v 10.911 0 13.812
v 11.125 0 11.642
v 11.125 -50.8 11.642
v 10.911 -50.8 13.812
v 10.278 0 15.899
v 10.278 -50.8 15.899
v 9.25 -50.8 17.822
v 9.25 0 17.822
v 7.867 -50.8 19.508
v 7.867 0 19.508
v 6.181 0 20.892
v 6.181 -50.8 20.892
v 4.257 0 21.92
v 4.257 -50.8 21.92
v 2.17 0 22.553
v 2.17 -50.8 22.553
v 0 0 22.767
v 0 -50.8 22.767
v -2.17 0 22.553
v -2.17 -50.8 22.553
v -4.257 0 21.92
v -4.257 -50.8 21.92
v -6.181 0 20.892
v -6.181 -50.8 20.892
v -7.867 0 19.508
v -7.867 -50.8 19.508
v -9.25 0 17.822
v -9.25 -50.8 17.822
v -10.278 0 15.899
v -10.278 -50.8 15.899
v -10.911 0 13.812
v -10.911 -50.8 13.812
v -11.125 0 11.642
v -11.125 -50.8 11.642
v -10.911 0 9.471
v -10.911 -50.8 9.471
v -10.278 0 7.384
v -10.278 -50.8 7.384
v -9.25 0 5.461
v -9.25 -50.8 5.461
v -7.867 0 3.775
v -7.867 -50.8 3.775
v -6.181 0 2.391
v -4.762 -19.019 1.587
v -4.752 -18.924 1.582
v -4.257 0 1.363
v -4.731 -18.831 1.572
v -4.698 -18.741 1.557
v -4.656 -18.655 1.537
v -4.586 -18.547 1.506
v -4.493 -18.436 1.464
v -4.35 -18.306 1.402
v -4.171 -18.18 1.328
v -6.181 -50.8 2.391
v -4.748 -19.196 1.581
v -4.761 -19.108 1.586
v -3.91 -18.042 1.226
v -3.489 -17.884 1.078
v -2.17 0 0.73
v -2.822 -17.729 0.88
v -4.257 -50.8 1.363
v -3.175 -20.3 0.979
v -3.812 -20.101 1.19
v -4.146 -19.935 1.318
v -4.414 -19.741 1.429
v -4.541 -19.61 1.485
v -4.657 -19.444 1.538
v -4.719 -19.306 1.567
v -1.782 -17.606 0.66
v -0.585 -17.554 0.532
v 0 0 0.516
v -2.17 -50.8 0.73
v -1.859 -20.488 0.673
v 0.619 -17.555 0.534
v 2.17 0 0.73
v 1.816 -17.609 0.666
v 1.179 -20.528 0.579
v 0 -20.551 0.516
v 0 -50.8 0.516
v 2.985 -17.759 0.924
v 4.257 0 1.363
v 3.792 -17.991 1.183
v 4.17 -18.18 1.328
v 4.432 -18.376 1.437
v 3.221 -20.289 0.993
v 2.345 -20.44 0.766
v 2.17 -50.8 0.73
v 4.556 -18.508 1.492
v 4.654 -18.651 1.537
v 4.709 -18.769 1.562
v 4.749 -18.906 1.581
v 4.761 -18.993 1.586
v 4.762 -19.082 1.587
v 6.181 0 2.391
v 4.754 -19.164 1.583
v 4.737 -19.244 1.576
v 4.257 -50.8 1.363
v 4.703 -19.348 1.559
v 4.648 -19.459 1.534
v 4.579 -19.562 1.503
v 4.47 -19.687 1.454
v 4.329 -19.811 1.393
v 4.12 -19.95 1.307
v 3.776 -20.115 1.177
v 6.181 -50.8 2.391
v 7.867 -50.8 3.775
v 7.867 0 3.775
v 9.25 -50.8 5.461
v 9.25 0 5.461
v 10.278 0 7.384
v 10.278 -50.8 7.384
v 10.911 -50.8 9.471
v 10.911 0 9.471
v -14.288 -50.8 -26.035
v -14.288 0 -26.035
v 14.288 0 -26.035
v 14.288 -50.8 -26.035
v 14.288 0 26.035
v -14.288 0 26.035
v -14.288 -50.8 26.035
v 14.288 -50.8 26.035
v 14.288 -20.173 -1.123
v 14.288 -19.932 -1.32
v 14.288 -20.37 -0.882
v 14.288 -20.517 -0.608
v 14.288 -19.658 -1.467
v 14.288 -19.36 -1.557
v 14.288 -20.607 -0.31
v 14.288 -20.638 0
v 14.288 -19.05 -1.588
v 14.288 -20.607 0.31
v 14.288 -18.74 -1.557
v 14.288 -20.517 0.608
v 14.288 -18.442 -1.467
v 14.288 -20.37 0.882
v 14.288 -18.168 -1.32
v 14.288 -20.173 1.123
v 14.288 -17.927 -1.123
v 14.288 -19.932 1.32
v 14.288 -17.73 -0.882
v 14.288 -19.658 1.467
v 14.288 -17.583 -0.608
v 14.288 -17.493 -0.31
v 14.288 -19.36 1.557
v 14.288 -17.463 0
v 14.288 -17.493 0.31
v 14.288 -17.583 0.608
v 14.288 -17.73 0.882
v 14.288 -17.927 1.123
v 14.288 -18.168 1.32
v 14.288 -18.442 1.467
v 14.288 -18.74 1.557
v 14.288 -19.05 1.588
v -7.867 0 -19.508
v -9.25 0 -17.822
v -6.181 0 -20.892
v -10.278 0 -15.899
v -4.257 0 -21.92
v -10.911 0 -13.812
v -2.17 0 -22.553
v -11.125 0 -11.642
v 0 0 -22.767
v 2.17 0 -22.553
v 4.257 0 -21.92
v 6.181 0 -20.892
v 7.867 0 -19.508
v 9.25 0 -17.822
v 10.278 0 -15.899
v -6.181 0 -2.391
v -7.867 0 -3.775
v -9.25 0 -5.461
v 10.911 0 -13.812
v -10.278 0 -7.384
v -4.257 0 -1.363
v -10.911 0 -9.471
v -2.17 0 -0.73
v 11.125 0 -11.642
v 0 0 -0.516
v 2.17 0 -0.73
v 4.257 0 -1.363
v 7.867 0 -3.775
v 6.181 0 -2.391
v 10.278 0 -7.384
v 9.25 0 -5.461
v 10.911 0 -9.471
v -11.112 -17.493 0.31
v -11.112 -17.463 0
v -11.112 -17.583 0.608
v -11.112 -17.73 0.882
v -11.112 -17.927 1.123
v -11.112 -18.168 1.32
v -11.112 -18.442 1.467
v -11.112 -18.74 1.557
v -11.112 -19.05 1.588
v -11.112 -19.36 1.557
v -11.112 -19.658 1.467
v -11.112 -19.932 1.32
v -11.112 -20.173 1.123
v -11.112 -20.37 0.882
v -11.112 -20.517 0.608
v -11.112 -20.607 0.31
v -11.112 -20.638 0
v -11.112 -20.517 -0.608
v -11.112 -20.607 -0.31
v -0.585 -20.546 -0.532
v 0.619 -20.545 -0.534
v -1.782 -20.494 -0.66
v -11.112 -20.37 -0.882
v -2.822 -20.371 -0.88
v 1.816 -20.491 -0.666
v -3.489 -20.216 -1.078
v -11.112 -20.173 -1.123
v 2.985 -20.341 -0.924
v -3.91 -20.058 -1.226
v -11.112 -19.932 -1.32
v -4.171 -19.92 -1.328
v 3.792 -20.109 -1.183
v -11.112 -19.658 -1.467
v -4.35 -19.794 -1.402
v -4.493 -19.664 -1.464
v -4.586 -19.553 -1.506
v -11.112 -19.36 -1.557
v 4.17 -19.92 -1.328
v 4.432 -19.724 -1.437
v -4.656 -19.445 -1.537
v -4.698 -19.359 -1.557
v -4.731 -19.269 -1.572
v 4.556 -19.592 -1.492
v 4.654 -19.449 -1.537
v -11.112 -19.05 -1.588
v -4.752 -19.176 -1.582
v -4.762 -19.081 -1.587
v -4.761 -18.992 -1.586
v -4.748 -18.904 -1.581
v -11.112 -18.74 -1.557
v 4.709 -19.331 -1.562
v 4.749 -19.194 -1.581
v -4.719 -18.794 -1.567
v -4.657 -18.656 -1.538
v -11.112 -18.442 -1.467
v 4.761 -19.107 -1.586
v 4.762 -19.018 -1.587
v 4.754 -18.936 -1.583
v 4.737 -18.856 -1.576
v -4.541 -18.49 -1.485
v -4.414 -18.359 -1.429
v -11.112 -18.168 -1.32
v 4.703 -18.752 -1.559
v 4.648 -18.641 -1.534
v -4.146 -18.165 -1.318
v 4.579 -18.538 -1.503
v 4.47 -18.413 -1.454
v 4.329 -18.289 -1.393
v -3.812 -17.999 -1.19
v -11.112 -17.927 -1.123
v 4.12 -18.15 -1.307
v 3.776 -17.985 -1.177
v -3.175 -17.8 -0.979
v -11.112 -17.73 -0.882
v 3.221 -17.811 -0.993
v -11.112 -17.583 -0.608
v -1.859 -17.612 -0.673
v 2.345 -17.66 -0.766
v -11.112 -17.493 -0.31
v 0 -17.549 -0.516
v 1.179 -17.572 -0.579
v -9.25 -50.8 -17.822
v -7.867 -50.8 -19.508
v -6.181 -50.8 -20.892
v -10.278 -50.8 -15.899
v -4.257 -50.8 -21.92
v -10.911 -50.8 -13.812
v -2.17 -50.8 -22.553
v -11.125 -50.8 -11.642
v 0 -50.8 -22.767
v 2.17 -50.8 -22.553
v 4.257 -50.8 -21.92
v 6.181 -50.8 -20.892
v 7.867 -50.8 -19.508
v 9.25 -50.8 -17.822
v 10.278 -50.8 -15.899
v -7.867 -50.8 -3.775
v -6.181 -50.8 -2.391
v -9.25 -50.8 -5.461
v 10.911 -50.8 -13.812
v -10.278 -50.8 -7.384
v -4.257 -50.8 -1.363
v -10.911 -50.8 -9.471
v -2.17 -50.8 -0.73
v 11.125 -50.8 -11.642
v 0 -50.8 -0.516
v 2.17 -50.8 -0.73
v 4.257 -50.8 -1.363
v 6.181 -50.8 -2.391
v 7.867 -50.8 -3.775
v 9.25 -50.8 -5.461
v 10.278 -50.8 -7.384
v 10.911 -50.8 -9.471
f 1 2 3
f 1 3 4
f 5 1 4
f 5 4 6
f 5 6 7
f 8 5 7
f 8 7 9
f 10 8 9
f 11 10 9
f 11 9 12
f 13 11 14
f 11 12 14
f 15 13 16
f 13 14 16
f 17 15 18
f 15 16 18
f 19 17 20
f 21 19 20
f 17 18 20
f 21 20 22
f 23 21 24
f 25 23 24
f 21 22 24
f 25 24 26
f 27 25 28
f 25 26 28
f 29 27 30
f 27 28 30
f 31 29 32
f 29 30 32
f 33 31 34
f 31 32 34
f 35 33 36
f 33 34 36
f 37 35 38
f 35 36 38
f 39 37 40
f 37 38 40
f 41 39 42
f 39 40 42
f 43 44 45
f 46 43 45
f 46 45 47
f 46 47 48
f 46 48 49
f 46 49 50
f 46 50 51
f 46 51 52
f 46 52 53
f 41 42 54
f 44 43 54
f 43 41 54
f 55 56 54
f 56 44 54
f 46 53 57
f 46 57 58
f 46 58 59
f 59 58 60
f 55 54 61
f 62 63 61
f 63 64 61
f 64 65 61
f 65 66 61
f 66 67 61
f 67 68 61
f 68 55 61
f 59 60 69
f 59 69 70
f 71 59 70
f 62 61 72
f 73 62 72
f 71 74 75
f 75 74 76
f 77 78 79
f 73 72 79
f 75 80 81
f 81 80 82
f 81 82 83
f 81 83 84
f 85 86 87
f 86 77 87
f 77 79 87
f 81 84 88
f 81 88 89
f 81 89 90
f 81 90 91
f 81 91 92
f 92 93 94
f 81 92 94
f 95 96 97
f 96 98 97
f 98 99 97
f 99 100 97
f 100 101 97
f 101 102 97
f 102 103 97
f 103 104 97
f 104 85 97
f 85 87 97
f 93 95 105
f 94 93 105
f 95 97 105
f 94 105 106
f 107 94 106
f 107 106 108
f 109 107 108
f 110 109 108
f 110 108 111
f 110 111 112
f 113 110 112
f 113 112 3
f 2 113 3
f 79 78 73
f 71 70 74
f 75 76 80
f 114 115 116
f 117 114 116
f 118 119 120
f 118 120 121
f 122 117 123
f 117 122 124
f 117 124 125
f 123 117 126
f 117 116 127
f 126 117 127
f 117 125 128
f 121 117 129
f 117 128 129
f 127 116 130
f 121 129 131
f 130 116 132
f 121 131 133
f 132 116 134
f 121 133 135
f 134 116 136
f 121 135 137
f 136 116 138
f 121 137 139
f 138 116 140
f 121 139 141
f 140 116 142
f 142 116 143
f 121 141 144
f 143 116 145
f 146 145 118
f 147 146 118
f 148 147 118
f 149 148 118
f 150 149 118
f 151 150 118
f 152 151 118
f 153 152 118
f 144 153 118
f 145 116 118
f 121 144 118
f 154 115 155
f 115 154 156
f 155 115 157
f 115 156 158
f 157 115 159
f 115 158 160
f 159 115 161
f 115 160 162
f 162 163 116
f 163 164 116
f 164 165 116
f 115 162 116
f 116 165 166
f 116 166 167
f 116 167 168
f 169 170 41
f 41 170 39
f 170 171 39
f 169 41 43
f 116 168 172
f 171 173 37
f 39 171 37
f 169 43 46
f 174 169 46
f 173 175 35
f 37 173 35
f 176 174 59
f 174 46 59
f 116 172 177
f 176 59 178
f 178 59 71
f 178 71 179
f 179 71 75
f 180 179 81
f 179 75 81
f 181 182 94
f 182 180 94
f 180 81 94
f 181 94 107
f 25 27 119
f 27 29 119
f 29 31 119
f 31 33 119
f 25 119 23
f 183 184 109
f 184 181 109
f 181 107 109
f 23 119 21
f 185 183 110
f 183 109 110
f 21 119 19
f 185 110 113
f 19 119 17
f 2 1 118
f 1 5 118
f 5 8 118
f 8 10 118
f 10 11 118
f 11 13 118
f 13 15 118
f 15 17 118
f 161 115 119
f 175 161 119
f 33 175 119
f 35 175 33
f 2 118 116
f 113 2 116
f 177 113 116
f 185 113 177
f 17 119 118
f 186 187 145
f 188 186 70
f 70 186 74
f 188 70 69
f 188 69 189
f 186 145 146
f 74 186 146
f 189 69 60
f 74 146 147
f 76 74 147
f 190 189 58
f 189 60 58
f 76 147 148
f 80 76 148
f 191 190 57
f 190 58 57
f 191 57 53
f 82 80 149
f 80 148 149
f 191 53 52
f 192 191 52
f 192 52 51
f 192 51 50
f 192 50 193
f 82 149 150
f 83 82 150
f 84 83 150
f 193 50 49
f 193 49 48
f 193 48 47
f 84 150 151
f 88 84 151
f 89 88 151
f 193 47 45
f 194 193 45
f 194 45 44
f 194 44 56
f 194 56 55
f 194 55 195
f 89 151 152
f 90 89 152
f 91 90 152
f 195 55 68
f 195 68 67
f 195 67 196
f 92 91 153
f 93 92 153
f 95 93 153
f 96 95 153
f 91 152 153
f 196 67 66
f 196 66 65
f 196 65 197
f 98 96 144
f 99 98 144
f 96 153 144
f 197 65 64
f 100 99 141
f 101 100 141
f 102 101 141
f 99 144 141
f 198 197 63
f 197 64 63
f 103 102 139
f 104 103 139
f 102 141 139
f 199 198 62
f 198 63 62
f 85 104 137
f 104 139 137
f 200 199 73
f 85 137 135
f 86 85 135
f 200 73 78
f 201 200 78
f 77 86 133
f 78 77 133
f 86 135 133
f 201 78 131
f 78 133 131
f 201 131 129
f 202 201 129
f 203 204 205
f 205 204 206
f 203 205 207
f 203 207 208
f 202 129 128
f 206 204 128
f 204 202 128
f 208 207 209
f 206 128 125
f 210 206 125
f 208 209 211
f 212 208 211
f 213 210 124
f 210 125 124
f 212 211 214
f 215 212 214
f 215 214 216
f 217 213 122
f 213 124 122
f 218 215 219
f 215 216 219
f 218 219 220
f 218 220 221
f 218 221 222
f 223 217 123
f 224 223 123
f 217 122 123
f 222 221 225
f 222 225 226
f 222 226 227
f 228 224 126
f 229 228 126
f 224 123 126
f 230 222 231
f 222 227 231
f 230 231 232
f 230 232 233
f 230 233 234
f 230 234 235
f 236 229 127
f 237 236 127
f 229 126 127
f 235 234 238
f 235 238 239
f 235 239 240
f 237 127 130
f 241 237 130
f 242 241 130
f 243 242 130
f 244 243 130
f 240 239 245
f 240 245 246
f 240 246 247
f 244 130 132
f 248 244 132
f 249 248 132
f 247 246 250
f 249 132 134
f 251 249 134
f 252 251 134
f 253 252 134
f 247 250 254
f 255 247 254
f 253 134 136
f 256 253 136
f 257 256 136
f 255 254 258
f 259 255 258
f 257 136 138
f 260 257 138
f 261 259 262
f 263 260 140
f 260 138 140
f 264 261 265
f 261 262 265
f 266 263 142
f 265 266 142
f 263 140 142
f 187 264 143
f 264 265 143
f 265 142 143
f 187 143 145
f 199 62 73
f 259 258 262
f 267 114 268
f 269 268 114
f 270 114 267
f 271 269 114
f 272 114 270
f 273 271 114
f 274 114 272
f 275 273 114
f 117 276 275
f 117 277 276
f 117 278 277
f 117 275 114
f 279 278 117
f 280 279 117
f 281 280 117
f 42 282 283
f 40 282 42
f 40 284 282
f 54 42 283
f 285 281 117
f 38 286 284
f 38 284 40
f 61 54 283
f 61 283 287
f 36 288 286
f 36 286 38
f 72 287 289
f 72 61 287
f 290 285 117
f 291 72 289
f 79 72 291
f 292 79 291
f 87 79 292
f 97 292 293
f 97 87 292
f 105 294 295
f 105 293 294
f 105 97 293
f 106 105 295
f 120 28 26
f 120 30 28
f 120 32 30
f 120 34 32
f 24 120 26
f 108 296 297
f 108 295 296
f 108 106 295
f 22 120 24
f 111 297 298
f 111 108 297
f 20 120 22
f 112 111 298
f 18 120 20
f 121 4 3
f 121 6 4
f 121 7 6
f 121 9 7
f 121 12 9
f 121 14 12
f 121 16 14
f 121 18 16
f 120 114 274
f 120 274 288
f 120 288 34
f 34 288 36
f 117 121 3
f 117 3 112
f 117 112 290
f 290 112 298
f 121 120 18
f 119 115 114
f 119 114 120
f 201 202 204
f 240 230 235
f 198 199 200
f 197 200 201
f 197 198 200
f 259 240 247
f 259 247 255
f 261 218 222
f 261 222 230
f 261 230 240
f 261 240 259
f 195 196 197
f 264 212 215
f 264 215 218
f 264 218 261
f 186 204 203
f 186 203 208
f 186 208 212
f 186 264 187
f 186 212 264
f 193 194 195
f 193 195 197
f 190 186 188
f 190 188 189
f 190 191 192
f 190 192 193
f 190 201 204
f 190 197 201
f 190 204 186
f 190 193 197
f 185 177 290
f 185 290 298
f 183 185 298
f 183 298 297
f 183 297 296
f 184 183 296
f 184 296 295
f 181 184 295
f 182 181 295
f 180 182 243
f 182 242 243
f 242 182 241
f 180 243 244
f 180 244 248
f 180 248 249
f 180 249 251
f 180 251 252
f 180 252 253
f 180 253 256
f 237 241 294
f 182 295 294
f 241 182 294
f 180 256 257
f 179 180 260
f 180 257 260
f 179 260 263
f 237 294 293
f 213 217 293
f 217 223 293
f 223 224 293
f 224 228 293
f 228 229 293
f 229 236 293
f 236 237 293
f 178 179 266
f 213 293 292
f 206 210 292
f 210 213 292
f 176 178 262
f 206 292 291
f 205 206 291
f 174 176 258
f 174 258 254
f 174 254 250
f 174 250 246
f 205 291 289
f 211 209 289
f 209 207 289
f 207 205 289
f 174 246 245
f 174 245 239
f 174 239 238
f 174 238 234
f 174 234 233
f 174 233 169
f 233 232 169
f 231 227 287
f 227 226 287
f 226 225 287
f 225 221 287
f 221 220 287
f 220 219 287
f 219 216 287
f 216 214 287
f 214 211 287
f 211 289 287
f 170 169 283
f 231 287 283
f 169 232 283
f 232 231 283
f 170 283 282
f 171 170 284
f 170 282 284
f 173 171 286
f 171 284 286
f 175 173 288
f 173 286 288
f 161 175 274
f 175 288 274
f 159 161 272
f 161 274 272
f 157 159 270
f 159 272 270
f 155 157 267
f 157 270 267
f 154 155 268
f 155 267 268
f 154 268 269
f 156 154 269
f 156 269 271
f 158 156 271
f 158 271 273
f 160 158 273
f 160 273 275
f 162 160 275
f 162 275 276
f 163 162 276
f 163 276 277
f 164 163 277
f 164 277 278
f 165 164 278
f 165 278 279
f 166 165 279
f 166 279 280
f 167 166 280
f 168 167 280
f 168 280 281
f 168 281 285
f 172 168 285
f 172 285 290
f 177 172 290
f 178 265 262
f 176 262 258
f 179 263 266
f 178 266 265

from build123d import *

# Parameters (mm, degrees)
F0_W     = 28.575
F0_H     = 52.07
F1_DEPTH = 50.8
F2_R     = 11.1252
F3_DEPTH = 50.801
F4_R     = 1.5875
F5_DEPTH = 25.4


with BuildPart() as f1:
    # F0 (on Front) → F1 (new body)
    with BuildSketch(Plane.XZ):
        Rectangle(F0_W, F0_H)
    extrude(amount=F1_DEPTH)

    # F2 (on face) → F3 (cut, through all)
    with BuildSketch(Plane.XZ.offset(50.8)):
        with Locations((0, 11.641667)):
            Circle(F2_R)
        with Locations((0, -11.641667)):
            Circle(F2_R)
    extrude(amount=-F3_DEPTH, mode=Mode.SUBTRACT)

    # F4 (on face) → F5 (cut)
    with BuildSketch(Plane.YZ.offset(14.2875)):
        with Locations((-19.05, 0)):
            Circle(F4_R)
    extrude(amount=-F5_DEPTH, mode=Mode.SUBTRACT)


solid = f1.part
